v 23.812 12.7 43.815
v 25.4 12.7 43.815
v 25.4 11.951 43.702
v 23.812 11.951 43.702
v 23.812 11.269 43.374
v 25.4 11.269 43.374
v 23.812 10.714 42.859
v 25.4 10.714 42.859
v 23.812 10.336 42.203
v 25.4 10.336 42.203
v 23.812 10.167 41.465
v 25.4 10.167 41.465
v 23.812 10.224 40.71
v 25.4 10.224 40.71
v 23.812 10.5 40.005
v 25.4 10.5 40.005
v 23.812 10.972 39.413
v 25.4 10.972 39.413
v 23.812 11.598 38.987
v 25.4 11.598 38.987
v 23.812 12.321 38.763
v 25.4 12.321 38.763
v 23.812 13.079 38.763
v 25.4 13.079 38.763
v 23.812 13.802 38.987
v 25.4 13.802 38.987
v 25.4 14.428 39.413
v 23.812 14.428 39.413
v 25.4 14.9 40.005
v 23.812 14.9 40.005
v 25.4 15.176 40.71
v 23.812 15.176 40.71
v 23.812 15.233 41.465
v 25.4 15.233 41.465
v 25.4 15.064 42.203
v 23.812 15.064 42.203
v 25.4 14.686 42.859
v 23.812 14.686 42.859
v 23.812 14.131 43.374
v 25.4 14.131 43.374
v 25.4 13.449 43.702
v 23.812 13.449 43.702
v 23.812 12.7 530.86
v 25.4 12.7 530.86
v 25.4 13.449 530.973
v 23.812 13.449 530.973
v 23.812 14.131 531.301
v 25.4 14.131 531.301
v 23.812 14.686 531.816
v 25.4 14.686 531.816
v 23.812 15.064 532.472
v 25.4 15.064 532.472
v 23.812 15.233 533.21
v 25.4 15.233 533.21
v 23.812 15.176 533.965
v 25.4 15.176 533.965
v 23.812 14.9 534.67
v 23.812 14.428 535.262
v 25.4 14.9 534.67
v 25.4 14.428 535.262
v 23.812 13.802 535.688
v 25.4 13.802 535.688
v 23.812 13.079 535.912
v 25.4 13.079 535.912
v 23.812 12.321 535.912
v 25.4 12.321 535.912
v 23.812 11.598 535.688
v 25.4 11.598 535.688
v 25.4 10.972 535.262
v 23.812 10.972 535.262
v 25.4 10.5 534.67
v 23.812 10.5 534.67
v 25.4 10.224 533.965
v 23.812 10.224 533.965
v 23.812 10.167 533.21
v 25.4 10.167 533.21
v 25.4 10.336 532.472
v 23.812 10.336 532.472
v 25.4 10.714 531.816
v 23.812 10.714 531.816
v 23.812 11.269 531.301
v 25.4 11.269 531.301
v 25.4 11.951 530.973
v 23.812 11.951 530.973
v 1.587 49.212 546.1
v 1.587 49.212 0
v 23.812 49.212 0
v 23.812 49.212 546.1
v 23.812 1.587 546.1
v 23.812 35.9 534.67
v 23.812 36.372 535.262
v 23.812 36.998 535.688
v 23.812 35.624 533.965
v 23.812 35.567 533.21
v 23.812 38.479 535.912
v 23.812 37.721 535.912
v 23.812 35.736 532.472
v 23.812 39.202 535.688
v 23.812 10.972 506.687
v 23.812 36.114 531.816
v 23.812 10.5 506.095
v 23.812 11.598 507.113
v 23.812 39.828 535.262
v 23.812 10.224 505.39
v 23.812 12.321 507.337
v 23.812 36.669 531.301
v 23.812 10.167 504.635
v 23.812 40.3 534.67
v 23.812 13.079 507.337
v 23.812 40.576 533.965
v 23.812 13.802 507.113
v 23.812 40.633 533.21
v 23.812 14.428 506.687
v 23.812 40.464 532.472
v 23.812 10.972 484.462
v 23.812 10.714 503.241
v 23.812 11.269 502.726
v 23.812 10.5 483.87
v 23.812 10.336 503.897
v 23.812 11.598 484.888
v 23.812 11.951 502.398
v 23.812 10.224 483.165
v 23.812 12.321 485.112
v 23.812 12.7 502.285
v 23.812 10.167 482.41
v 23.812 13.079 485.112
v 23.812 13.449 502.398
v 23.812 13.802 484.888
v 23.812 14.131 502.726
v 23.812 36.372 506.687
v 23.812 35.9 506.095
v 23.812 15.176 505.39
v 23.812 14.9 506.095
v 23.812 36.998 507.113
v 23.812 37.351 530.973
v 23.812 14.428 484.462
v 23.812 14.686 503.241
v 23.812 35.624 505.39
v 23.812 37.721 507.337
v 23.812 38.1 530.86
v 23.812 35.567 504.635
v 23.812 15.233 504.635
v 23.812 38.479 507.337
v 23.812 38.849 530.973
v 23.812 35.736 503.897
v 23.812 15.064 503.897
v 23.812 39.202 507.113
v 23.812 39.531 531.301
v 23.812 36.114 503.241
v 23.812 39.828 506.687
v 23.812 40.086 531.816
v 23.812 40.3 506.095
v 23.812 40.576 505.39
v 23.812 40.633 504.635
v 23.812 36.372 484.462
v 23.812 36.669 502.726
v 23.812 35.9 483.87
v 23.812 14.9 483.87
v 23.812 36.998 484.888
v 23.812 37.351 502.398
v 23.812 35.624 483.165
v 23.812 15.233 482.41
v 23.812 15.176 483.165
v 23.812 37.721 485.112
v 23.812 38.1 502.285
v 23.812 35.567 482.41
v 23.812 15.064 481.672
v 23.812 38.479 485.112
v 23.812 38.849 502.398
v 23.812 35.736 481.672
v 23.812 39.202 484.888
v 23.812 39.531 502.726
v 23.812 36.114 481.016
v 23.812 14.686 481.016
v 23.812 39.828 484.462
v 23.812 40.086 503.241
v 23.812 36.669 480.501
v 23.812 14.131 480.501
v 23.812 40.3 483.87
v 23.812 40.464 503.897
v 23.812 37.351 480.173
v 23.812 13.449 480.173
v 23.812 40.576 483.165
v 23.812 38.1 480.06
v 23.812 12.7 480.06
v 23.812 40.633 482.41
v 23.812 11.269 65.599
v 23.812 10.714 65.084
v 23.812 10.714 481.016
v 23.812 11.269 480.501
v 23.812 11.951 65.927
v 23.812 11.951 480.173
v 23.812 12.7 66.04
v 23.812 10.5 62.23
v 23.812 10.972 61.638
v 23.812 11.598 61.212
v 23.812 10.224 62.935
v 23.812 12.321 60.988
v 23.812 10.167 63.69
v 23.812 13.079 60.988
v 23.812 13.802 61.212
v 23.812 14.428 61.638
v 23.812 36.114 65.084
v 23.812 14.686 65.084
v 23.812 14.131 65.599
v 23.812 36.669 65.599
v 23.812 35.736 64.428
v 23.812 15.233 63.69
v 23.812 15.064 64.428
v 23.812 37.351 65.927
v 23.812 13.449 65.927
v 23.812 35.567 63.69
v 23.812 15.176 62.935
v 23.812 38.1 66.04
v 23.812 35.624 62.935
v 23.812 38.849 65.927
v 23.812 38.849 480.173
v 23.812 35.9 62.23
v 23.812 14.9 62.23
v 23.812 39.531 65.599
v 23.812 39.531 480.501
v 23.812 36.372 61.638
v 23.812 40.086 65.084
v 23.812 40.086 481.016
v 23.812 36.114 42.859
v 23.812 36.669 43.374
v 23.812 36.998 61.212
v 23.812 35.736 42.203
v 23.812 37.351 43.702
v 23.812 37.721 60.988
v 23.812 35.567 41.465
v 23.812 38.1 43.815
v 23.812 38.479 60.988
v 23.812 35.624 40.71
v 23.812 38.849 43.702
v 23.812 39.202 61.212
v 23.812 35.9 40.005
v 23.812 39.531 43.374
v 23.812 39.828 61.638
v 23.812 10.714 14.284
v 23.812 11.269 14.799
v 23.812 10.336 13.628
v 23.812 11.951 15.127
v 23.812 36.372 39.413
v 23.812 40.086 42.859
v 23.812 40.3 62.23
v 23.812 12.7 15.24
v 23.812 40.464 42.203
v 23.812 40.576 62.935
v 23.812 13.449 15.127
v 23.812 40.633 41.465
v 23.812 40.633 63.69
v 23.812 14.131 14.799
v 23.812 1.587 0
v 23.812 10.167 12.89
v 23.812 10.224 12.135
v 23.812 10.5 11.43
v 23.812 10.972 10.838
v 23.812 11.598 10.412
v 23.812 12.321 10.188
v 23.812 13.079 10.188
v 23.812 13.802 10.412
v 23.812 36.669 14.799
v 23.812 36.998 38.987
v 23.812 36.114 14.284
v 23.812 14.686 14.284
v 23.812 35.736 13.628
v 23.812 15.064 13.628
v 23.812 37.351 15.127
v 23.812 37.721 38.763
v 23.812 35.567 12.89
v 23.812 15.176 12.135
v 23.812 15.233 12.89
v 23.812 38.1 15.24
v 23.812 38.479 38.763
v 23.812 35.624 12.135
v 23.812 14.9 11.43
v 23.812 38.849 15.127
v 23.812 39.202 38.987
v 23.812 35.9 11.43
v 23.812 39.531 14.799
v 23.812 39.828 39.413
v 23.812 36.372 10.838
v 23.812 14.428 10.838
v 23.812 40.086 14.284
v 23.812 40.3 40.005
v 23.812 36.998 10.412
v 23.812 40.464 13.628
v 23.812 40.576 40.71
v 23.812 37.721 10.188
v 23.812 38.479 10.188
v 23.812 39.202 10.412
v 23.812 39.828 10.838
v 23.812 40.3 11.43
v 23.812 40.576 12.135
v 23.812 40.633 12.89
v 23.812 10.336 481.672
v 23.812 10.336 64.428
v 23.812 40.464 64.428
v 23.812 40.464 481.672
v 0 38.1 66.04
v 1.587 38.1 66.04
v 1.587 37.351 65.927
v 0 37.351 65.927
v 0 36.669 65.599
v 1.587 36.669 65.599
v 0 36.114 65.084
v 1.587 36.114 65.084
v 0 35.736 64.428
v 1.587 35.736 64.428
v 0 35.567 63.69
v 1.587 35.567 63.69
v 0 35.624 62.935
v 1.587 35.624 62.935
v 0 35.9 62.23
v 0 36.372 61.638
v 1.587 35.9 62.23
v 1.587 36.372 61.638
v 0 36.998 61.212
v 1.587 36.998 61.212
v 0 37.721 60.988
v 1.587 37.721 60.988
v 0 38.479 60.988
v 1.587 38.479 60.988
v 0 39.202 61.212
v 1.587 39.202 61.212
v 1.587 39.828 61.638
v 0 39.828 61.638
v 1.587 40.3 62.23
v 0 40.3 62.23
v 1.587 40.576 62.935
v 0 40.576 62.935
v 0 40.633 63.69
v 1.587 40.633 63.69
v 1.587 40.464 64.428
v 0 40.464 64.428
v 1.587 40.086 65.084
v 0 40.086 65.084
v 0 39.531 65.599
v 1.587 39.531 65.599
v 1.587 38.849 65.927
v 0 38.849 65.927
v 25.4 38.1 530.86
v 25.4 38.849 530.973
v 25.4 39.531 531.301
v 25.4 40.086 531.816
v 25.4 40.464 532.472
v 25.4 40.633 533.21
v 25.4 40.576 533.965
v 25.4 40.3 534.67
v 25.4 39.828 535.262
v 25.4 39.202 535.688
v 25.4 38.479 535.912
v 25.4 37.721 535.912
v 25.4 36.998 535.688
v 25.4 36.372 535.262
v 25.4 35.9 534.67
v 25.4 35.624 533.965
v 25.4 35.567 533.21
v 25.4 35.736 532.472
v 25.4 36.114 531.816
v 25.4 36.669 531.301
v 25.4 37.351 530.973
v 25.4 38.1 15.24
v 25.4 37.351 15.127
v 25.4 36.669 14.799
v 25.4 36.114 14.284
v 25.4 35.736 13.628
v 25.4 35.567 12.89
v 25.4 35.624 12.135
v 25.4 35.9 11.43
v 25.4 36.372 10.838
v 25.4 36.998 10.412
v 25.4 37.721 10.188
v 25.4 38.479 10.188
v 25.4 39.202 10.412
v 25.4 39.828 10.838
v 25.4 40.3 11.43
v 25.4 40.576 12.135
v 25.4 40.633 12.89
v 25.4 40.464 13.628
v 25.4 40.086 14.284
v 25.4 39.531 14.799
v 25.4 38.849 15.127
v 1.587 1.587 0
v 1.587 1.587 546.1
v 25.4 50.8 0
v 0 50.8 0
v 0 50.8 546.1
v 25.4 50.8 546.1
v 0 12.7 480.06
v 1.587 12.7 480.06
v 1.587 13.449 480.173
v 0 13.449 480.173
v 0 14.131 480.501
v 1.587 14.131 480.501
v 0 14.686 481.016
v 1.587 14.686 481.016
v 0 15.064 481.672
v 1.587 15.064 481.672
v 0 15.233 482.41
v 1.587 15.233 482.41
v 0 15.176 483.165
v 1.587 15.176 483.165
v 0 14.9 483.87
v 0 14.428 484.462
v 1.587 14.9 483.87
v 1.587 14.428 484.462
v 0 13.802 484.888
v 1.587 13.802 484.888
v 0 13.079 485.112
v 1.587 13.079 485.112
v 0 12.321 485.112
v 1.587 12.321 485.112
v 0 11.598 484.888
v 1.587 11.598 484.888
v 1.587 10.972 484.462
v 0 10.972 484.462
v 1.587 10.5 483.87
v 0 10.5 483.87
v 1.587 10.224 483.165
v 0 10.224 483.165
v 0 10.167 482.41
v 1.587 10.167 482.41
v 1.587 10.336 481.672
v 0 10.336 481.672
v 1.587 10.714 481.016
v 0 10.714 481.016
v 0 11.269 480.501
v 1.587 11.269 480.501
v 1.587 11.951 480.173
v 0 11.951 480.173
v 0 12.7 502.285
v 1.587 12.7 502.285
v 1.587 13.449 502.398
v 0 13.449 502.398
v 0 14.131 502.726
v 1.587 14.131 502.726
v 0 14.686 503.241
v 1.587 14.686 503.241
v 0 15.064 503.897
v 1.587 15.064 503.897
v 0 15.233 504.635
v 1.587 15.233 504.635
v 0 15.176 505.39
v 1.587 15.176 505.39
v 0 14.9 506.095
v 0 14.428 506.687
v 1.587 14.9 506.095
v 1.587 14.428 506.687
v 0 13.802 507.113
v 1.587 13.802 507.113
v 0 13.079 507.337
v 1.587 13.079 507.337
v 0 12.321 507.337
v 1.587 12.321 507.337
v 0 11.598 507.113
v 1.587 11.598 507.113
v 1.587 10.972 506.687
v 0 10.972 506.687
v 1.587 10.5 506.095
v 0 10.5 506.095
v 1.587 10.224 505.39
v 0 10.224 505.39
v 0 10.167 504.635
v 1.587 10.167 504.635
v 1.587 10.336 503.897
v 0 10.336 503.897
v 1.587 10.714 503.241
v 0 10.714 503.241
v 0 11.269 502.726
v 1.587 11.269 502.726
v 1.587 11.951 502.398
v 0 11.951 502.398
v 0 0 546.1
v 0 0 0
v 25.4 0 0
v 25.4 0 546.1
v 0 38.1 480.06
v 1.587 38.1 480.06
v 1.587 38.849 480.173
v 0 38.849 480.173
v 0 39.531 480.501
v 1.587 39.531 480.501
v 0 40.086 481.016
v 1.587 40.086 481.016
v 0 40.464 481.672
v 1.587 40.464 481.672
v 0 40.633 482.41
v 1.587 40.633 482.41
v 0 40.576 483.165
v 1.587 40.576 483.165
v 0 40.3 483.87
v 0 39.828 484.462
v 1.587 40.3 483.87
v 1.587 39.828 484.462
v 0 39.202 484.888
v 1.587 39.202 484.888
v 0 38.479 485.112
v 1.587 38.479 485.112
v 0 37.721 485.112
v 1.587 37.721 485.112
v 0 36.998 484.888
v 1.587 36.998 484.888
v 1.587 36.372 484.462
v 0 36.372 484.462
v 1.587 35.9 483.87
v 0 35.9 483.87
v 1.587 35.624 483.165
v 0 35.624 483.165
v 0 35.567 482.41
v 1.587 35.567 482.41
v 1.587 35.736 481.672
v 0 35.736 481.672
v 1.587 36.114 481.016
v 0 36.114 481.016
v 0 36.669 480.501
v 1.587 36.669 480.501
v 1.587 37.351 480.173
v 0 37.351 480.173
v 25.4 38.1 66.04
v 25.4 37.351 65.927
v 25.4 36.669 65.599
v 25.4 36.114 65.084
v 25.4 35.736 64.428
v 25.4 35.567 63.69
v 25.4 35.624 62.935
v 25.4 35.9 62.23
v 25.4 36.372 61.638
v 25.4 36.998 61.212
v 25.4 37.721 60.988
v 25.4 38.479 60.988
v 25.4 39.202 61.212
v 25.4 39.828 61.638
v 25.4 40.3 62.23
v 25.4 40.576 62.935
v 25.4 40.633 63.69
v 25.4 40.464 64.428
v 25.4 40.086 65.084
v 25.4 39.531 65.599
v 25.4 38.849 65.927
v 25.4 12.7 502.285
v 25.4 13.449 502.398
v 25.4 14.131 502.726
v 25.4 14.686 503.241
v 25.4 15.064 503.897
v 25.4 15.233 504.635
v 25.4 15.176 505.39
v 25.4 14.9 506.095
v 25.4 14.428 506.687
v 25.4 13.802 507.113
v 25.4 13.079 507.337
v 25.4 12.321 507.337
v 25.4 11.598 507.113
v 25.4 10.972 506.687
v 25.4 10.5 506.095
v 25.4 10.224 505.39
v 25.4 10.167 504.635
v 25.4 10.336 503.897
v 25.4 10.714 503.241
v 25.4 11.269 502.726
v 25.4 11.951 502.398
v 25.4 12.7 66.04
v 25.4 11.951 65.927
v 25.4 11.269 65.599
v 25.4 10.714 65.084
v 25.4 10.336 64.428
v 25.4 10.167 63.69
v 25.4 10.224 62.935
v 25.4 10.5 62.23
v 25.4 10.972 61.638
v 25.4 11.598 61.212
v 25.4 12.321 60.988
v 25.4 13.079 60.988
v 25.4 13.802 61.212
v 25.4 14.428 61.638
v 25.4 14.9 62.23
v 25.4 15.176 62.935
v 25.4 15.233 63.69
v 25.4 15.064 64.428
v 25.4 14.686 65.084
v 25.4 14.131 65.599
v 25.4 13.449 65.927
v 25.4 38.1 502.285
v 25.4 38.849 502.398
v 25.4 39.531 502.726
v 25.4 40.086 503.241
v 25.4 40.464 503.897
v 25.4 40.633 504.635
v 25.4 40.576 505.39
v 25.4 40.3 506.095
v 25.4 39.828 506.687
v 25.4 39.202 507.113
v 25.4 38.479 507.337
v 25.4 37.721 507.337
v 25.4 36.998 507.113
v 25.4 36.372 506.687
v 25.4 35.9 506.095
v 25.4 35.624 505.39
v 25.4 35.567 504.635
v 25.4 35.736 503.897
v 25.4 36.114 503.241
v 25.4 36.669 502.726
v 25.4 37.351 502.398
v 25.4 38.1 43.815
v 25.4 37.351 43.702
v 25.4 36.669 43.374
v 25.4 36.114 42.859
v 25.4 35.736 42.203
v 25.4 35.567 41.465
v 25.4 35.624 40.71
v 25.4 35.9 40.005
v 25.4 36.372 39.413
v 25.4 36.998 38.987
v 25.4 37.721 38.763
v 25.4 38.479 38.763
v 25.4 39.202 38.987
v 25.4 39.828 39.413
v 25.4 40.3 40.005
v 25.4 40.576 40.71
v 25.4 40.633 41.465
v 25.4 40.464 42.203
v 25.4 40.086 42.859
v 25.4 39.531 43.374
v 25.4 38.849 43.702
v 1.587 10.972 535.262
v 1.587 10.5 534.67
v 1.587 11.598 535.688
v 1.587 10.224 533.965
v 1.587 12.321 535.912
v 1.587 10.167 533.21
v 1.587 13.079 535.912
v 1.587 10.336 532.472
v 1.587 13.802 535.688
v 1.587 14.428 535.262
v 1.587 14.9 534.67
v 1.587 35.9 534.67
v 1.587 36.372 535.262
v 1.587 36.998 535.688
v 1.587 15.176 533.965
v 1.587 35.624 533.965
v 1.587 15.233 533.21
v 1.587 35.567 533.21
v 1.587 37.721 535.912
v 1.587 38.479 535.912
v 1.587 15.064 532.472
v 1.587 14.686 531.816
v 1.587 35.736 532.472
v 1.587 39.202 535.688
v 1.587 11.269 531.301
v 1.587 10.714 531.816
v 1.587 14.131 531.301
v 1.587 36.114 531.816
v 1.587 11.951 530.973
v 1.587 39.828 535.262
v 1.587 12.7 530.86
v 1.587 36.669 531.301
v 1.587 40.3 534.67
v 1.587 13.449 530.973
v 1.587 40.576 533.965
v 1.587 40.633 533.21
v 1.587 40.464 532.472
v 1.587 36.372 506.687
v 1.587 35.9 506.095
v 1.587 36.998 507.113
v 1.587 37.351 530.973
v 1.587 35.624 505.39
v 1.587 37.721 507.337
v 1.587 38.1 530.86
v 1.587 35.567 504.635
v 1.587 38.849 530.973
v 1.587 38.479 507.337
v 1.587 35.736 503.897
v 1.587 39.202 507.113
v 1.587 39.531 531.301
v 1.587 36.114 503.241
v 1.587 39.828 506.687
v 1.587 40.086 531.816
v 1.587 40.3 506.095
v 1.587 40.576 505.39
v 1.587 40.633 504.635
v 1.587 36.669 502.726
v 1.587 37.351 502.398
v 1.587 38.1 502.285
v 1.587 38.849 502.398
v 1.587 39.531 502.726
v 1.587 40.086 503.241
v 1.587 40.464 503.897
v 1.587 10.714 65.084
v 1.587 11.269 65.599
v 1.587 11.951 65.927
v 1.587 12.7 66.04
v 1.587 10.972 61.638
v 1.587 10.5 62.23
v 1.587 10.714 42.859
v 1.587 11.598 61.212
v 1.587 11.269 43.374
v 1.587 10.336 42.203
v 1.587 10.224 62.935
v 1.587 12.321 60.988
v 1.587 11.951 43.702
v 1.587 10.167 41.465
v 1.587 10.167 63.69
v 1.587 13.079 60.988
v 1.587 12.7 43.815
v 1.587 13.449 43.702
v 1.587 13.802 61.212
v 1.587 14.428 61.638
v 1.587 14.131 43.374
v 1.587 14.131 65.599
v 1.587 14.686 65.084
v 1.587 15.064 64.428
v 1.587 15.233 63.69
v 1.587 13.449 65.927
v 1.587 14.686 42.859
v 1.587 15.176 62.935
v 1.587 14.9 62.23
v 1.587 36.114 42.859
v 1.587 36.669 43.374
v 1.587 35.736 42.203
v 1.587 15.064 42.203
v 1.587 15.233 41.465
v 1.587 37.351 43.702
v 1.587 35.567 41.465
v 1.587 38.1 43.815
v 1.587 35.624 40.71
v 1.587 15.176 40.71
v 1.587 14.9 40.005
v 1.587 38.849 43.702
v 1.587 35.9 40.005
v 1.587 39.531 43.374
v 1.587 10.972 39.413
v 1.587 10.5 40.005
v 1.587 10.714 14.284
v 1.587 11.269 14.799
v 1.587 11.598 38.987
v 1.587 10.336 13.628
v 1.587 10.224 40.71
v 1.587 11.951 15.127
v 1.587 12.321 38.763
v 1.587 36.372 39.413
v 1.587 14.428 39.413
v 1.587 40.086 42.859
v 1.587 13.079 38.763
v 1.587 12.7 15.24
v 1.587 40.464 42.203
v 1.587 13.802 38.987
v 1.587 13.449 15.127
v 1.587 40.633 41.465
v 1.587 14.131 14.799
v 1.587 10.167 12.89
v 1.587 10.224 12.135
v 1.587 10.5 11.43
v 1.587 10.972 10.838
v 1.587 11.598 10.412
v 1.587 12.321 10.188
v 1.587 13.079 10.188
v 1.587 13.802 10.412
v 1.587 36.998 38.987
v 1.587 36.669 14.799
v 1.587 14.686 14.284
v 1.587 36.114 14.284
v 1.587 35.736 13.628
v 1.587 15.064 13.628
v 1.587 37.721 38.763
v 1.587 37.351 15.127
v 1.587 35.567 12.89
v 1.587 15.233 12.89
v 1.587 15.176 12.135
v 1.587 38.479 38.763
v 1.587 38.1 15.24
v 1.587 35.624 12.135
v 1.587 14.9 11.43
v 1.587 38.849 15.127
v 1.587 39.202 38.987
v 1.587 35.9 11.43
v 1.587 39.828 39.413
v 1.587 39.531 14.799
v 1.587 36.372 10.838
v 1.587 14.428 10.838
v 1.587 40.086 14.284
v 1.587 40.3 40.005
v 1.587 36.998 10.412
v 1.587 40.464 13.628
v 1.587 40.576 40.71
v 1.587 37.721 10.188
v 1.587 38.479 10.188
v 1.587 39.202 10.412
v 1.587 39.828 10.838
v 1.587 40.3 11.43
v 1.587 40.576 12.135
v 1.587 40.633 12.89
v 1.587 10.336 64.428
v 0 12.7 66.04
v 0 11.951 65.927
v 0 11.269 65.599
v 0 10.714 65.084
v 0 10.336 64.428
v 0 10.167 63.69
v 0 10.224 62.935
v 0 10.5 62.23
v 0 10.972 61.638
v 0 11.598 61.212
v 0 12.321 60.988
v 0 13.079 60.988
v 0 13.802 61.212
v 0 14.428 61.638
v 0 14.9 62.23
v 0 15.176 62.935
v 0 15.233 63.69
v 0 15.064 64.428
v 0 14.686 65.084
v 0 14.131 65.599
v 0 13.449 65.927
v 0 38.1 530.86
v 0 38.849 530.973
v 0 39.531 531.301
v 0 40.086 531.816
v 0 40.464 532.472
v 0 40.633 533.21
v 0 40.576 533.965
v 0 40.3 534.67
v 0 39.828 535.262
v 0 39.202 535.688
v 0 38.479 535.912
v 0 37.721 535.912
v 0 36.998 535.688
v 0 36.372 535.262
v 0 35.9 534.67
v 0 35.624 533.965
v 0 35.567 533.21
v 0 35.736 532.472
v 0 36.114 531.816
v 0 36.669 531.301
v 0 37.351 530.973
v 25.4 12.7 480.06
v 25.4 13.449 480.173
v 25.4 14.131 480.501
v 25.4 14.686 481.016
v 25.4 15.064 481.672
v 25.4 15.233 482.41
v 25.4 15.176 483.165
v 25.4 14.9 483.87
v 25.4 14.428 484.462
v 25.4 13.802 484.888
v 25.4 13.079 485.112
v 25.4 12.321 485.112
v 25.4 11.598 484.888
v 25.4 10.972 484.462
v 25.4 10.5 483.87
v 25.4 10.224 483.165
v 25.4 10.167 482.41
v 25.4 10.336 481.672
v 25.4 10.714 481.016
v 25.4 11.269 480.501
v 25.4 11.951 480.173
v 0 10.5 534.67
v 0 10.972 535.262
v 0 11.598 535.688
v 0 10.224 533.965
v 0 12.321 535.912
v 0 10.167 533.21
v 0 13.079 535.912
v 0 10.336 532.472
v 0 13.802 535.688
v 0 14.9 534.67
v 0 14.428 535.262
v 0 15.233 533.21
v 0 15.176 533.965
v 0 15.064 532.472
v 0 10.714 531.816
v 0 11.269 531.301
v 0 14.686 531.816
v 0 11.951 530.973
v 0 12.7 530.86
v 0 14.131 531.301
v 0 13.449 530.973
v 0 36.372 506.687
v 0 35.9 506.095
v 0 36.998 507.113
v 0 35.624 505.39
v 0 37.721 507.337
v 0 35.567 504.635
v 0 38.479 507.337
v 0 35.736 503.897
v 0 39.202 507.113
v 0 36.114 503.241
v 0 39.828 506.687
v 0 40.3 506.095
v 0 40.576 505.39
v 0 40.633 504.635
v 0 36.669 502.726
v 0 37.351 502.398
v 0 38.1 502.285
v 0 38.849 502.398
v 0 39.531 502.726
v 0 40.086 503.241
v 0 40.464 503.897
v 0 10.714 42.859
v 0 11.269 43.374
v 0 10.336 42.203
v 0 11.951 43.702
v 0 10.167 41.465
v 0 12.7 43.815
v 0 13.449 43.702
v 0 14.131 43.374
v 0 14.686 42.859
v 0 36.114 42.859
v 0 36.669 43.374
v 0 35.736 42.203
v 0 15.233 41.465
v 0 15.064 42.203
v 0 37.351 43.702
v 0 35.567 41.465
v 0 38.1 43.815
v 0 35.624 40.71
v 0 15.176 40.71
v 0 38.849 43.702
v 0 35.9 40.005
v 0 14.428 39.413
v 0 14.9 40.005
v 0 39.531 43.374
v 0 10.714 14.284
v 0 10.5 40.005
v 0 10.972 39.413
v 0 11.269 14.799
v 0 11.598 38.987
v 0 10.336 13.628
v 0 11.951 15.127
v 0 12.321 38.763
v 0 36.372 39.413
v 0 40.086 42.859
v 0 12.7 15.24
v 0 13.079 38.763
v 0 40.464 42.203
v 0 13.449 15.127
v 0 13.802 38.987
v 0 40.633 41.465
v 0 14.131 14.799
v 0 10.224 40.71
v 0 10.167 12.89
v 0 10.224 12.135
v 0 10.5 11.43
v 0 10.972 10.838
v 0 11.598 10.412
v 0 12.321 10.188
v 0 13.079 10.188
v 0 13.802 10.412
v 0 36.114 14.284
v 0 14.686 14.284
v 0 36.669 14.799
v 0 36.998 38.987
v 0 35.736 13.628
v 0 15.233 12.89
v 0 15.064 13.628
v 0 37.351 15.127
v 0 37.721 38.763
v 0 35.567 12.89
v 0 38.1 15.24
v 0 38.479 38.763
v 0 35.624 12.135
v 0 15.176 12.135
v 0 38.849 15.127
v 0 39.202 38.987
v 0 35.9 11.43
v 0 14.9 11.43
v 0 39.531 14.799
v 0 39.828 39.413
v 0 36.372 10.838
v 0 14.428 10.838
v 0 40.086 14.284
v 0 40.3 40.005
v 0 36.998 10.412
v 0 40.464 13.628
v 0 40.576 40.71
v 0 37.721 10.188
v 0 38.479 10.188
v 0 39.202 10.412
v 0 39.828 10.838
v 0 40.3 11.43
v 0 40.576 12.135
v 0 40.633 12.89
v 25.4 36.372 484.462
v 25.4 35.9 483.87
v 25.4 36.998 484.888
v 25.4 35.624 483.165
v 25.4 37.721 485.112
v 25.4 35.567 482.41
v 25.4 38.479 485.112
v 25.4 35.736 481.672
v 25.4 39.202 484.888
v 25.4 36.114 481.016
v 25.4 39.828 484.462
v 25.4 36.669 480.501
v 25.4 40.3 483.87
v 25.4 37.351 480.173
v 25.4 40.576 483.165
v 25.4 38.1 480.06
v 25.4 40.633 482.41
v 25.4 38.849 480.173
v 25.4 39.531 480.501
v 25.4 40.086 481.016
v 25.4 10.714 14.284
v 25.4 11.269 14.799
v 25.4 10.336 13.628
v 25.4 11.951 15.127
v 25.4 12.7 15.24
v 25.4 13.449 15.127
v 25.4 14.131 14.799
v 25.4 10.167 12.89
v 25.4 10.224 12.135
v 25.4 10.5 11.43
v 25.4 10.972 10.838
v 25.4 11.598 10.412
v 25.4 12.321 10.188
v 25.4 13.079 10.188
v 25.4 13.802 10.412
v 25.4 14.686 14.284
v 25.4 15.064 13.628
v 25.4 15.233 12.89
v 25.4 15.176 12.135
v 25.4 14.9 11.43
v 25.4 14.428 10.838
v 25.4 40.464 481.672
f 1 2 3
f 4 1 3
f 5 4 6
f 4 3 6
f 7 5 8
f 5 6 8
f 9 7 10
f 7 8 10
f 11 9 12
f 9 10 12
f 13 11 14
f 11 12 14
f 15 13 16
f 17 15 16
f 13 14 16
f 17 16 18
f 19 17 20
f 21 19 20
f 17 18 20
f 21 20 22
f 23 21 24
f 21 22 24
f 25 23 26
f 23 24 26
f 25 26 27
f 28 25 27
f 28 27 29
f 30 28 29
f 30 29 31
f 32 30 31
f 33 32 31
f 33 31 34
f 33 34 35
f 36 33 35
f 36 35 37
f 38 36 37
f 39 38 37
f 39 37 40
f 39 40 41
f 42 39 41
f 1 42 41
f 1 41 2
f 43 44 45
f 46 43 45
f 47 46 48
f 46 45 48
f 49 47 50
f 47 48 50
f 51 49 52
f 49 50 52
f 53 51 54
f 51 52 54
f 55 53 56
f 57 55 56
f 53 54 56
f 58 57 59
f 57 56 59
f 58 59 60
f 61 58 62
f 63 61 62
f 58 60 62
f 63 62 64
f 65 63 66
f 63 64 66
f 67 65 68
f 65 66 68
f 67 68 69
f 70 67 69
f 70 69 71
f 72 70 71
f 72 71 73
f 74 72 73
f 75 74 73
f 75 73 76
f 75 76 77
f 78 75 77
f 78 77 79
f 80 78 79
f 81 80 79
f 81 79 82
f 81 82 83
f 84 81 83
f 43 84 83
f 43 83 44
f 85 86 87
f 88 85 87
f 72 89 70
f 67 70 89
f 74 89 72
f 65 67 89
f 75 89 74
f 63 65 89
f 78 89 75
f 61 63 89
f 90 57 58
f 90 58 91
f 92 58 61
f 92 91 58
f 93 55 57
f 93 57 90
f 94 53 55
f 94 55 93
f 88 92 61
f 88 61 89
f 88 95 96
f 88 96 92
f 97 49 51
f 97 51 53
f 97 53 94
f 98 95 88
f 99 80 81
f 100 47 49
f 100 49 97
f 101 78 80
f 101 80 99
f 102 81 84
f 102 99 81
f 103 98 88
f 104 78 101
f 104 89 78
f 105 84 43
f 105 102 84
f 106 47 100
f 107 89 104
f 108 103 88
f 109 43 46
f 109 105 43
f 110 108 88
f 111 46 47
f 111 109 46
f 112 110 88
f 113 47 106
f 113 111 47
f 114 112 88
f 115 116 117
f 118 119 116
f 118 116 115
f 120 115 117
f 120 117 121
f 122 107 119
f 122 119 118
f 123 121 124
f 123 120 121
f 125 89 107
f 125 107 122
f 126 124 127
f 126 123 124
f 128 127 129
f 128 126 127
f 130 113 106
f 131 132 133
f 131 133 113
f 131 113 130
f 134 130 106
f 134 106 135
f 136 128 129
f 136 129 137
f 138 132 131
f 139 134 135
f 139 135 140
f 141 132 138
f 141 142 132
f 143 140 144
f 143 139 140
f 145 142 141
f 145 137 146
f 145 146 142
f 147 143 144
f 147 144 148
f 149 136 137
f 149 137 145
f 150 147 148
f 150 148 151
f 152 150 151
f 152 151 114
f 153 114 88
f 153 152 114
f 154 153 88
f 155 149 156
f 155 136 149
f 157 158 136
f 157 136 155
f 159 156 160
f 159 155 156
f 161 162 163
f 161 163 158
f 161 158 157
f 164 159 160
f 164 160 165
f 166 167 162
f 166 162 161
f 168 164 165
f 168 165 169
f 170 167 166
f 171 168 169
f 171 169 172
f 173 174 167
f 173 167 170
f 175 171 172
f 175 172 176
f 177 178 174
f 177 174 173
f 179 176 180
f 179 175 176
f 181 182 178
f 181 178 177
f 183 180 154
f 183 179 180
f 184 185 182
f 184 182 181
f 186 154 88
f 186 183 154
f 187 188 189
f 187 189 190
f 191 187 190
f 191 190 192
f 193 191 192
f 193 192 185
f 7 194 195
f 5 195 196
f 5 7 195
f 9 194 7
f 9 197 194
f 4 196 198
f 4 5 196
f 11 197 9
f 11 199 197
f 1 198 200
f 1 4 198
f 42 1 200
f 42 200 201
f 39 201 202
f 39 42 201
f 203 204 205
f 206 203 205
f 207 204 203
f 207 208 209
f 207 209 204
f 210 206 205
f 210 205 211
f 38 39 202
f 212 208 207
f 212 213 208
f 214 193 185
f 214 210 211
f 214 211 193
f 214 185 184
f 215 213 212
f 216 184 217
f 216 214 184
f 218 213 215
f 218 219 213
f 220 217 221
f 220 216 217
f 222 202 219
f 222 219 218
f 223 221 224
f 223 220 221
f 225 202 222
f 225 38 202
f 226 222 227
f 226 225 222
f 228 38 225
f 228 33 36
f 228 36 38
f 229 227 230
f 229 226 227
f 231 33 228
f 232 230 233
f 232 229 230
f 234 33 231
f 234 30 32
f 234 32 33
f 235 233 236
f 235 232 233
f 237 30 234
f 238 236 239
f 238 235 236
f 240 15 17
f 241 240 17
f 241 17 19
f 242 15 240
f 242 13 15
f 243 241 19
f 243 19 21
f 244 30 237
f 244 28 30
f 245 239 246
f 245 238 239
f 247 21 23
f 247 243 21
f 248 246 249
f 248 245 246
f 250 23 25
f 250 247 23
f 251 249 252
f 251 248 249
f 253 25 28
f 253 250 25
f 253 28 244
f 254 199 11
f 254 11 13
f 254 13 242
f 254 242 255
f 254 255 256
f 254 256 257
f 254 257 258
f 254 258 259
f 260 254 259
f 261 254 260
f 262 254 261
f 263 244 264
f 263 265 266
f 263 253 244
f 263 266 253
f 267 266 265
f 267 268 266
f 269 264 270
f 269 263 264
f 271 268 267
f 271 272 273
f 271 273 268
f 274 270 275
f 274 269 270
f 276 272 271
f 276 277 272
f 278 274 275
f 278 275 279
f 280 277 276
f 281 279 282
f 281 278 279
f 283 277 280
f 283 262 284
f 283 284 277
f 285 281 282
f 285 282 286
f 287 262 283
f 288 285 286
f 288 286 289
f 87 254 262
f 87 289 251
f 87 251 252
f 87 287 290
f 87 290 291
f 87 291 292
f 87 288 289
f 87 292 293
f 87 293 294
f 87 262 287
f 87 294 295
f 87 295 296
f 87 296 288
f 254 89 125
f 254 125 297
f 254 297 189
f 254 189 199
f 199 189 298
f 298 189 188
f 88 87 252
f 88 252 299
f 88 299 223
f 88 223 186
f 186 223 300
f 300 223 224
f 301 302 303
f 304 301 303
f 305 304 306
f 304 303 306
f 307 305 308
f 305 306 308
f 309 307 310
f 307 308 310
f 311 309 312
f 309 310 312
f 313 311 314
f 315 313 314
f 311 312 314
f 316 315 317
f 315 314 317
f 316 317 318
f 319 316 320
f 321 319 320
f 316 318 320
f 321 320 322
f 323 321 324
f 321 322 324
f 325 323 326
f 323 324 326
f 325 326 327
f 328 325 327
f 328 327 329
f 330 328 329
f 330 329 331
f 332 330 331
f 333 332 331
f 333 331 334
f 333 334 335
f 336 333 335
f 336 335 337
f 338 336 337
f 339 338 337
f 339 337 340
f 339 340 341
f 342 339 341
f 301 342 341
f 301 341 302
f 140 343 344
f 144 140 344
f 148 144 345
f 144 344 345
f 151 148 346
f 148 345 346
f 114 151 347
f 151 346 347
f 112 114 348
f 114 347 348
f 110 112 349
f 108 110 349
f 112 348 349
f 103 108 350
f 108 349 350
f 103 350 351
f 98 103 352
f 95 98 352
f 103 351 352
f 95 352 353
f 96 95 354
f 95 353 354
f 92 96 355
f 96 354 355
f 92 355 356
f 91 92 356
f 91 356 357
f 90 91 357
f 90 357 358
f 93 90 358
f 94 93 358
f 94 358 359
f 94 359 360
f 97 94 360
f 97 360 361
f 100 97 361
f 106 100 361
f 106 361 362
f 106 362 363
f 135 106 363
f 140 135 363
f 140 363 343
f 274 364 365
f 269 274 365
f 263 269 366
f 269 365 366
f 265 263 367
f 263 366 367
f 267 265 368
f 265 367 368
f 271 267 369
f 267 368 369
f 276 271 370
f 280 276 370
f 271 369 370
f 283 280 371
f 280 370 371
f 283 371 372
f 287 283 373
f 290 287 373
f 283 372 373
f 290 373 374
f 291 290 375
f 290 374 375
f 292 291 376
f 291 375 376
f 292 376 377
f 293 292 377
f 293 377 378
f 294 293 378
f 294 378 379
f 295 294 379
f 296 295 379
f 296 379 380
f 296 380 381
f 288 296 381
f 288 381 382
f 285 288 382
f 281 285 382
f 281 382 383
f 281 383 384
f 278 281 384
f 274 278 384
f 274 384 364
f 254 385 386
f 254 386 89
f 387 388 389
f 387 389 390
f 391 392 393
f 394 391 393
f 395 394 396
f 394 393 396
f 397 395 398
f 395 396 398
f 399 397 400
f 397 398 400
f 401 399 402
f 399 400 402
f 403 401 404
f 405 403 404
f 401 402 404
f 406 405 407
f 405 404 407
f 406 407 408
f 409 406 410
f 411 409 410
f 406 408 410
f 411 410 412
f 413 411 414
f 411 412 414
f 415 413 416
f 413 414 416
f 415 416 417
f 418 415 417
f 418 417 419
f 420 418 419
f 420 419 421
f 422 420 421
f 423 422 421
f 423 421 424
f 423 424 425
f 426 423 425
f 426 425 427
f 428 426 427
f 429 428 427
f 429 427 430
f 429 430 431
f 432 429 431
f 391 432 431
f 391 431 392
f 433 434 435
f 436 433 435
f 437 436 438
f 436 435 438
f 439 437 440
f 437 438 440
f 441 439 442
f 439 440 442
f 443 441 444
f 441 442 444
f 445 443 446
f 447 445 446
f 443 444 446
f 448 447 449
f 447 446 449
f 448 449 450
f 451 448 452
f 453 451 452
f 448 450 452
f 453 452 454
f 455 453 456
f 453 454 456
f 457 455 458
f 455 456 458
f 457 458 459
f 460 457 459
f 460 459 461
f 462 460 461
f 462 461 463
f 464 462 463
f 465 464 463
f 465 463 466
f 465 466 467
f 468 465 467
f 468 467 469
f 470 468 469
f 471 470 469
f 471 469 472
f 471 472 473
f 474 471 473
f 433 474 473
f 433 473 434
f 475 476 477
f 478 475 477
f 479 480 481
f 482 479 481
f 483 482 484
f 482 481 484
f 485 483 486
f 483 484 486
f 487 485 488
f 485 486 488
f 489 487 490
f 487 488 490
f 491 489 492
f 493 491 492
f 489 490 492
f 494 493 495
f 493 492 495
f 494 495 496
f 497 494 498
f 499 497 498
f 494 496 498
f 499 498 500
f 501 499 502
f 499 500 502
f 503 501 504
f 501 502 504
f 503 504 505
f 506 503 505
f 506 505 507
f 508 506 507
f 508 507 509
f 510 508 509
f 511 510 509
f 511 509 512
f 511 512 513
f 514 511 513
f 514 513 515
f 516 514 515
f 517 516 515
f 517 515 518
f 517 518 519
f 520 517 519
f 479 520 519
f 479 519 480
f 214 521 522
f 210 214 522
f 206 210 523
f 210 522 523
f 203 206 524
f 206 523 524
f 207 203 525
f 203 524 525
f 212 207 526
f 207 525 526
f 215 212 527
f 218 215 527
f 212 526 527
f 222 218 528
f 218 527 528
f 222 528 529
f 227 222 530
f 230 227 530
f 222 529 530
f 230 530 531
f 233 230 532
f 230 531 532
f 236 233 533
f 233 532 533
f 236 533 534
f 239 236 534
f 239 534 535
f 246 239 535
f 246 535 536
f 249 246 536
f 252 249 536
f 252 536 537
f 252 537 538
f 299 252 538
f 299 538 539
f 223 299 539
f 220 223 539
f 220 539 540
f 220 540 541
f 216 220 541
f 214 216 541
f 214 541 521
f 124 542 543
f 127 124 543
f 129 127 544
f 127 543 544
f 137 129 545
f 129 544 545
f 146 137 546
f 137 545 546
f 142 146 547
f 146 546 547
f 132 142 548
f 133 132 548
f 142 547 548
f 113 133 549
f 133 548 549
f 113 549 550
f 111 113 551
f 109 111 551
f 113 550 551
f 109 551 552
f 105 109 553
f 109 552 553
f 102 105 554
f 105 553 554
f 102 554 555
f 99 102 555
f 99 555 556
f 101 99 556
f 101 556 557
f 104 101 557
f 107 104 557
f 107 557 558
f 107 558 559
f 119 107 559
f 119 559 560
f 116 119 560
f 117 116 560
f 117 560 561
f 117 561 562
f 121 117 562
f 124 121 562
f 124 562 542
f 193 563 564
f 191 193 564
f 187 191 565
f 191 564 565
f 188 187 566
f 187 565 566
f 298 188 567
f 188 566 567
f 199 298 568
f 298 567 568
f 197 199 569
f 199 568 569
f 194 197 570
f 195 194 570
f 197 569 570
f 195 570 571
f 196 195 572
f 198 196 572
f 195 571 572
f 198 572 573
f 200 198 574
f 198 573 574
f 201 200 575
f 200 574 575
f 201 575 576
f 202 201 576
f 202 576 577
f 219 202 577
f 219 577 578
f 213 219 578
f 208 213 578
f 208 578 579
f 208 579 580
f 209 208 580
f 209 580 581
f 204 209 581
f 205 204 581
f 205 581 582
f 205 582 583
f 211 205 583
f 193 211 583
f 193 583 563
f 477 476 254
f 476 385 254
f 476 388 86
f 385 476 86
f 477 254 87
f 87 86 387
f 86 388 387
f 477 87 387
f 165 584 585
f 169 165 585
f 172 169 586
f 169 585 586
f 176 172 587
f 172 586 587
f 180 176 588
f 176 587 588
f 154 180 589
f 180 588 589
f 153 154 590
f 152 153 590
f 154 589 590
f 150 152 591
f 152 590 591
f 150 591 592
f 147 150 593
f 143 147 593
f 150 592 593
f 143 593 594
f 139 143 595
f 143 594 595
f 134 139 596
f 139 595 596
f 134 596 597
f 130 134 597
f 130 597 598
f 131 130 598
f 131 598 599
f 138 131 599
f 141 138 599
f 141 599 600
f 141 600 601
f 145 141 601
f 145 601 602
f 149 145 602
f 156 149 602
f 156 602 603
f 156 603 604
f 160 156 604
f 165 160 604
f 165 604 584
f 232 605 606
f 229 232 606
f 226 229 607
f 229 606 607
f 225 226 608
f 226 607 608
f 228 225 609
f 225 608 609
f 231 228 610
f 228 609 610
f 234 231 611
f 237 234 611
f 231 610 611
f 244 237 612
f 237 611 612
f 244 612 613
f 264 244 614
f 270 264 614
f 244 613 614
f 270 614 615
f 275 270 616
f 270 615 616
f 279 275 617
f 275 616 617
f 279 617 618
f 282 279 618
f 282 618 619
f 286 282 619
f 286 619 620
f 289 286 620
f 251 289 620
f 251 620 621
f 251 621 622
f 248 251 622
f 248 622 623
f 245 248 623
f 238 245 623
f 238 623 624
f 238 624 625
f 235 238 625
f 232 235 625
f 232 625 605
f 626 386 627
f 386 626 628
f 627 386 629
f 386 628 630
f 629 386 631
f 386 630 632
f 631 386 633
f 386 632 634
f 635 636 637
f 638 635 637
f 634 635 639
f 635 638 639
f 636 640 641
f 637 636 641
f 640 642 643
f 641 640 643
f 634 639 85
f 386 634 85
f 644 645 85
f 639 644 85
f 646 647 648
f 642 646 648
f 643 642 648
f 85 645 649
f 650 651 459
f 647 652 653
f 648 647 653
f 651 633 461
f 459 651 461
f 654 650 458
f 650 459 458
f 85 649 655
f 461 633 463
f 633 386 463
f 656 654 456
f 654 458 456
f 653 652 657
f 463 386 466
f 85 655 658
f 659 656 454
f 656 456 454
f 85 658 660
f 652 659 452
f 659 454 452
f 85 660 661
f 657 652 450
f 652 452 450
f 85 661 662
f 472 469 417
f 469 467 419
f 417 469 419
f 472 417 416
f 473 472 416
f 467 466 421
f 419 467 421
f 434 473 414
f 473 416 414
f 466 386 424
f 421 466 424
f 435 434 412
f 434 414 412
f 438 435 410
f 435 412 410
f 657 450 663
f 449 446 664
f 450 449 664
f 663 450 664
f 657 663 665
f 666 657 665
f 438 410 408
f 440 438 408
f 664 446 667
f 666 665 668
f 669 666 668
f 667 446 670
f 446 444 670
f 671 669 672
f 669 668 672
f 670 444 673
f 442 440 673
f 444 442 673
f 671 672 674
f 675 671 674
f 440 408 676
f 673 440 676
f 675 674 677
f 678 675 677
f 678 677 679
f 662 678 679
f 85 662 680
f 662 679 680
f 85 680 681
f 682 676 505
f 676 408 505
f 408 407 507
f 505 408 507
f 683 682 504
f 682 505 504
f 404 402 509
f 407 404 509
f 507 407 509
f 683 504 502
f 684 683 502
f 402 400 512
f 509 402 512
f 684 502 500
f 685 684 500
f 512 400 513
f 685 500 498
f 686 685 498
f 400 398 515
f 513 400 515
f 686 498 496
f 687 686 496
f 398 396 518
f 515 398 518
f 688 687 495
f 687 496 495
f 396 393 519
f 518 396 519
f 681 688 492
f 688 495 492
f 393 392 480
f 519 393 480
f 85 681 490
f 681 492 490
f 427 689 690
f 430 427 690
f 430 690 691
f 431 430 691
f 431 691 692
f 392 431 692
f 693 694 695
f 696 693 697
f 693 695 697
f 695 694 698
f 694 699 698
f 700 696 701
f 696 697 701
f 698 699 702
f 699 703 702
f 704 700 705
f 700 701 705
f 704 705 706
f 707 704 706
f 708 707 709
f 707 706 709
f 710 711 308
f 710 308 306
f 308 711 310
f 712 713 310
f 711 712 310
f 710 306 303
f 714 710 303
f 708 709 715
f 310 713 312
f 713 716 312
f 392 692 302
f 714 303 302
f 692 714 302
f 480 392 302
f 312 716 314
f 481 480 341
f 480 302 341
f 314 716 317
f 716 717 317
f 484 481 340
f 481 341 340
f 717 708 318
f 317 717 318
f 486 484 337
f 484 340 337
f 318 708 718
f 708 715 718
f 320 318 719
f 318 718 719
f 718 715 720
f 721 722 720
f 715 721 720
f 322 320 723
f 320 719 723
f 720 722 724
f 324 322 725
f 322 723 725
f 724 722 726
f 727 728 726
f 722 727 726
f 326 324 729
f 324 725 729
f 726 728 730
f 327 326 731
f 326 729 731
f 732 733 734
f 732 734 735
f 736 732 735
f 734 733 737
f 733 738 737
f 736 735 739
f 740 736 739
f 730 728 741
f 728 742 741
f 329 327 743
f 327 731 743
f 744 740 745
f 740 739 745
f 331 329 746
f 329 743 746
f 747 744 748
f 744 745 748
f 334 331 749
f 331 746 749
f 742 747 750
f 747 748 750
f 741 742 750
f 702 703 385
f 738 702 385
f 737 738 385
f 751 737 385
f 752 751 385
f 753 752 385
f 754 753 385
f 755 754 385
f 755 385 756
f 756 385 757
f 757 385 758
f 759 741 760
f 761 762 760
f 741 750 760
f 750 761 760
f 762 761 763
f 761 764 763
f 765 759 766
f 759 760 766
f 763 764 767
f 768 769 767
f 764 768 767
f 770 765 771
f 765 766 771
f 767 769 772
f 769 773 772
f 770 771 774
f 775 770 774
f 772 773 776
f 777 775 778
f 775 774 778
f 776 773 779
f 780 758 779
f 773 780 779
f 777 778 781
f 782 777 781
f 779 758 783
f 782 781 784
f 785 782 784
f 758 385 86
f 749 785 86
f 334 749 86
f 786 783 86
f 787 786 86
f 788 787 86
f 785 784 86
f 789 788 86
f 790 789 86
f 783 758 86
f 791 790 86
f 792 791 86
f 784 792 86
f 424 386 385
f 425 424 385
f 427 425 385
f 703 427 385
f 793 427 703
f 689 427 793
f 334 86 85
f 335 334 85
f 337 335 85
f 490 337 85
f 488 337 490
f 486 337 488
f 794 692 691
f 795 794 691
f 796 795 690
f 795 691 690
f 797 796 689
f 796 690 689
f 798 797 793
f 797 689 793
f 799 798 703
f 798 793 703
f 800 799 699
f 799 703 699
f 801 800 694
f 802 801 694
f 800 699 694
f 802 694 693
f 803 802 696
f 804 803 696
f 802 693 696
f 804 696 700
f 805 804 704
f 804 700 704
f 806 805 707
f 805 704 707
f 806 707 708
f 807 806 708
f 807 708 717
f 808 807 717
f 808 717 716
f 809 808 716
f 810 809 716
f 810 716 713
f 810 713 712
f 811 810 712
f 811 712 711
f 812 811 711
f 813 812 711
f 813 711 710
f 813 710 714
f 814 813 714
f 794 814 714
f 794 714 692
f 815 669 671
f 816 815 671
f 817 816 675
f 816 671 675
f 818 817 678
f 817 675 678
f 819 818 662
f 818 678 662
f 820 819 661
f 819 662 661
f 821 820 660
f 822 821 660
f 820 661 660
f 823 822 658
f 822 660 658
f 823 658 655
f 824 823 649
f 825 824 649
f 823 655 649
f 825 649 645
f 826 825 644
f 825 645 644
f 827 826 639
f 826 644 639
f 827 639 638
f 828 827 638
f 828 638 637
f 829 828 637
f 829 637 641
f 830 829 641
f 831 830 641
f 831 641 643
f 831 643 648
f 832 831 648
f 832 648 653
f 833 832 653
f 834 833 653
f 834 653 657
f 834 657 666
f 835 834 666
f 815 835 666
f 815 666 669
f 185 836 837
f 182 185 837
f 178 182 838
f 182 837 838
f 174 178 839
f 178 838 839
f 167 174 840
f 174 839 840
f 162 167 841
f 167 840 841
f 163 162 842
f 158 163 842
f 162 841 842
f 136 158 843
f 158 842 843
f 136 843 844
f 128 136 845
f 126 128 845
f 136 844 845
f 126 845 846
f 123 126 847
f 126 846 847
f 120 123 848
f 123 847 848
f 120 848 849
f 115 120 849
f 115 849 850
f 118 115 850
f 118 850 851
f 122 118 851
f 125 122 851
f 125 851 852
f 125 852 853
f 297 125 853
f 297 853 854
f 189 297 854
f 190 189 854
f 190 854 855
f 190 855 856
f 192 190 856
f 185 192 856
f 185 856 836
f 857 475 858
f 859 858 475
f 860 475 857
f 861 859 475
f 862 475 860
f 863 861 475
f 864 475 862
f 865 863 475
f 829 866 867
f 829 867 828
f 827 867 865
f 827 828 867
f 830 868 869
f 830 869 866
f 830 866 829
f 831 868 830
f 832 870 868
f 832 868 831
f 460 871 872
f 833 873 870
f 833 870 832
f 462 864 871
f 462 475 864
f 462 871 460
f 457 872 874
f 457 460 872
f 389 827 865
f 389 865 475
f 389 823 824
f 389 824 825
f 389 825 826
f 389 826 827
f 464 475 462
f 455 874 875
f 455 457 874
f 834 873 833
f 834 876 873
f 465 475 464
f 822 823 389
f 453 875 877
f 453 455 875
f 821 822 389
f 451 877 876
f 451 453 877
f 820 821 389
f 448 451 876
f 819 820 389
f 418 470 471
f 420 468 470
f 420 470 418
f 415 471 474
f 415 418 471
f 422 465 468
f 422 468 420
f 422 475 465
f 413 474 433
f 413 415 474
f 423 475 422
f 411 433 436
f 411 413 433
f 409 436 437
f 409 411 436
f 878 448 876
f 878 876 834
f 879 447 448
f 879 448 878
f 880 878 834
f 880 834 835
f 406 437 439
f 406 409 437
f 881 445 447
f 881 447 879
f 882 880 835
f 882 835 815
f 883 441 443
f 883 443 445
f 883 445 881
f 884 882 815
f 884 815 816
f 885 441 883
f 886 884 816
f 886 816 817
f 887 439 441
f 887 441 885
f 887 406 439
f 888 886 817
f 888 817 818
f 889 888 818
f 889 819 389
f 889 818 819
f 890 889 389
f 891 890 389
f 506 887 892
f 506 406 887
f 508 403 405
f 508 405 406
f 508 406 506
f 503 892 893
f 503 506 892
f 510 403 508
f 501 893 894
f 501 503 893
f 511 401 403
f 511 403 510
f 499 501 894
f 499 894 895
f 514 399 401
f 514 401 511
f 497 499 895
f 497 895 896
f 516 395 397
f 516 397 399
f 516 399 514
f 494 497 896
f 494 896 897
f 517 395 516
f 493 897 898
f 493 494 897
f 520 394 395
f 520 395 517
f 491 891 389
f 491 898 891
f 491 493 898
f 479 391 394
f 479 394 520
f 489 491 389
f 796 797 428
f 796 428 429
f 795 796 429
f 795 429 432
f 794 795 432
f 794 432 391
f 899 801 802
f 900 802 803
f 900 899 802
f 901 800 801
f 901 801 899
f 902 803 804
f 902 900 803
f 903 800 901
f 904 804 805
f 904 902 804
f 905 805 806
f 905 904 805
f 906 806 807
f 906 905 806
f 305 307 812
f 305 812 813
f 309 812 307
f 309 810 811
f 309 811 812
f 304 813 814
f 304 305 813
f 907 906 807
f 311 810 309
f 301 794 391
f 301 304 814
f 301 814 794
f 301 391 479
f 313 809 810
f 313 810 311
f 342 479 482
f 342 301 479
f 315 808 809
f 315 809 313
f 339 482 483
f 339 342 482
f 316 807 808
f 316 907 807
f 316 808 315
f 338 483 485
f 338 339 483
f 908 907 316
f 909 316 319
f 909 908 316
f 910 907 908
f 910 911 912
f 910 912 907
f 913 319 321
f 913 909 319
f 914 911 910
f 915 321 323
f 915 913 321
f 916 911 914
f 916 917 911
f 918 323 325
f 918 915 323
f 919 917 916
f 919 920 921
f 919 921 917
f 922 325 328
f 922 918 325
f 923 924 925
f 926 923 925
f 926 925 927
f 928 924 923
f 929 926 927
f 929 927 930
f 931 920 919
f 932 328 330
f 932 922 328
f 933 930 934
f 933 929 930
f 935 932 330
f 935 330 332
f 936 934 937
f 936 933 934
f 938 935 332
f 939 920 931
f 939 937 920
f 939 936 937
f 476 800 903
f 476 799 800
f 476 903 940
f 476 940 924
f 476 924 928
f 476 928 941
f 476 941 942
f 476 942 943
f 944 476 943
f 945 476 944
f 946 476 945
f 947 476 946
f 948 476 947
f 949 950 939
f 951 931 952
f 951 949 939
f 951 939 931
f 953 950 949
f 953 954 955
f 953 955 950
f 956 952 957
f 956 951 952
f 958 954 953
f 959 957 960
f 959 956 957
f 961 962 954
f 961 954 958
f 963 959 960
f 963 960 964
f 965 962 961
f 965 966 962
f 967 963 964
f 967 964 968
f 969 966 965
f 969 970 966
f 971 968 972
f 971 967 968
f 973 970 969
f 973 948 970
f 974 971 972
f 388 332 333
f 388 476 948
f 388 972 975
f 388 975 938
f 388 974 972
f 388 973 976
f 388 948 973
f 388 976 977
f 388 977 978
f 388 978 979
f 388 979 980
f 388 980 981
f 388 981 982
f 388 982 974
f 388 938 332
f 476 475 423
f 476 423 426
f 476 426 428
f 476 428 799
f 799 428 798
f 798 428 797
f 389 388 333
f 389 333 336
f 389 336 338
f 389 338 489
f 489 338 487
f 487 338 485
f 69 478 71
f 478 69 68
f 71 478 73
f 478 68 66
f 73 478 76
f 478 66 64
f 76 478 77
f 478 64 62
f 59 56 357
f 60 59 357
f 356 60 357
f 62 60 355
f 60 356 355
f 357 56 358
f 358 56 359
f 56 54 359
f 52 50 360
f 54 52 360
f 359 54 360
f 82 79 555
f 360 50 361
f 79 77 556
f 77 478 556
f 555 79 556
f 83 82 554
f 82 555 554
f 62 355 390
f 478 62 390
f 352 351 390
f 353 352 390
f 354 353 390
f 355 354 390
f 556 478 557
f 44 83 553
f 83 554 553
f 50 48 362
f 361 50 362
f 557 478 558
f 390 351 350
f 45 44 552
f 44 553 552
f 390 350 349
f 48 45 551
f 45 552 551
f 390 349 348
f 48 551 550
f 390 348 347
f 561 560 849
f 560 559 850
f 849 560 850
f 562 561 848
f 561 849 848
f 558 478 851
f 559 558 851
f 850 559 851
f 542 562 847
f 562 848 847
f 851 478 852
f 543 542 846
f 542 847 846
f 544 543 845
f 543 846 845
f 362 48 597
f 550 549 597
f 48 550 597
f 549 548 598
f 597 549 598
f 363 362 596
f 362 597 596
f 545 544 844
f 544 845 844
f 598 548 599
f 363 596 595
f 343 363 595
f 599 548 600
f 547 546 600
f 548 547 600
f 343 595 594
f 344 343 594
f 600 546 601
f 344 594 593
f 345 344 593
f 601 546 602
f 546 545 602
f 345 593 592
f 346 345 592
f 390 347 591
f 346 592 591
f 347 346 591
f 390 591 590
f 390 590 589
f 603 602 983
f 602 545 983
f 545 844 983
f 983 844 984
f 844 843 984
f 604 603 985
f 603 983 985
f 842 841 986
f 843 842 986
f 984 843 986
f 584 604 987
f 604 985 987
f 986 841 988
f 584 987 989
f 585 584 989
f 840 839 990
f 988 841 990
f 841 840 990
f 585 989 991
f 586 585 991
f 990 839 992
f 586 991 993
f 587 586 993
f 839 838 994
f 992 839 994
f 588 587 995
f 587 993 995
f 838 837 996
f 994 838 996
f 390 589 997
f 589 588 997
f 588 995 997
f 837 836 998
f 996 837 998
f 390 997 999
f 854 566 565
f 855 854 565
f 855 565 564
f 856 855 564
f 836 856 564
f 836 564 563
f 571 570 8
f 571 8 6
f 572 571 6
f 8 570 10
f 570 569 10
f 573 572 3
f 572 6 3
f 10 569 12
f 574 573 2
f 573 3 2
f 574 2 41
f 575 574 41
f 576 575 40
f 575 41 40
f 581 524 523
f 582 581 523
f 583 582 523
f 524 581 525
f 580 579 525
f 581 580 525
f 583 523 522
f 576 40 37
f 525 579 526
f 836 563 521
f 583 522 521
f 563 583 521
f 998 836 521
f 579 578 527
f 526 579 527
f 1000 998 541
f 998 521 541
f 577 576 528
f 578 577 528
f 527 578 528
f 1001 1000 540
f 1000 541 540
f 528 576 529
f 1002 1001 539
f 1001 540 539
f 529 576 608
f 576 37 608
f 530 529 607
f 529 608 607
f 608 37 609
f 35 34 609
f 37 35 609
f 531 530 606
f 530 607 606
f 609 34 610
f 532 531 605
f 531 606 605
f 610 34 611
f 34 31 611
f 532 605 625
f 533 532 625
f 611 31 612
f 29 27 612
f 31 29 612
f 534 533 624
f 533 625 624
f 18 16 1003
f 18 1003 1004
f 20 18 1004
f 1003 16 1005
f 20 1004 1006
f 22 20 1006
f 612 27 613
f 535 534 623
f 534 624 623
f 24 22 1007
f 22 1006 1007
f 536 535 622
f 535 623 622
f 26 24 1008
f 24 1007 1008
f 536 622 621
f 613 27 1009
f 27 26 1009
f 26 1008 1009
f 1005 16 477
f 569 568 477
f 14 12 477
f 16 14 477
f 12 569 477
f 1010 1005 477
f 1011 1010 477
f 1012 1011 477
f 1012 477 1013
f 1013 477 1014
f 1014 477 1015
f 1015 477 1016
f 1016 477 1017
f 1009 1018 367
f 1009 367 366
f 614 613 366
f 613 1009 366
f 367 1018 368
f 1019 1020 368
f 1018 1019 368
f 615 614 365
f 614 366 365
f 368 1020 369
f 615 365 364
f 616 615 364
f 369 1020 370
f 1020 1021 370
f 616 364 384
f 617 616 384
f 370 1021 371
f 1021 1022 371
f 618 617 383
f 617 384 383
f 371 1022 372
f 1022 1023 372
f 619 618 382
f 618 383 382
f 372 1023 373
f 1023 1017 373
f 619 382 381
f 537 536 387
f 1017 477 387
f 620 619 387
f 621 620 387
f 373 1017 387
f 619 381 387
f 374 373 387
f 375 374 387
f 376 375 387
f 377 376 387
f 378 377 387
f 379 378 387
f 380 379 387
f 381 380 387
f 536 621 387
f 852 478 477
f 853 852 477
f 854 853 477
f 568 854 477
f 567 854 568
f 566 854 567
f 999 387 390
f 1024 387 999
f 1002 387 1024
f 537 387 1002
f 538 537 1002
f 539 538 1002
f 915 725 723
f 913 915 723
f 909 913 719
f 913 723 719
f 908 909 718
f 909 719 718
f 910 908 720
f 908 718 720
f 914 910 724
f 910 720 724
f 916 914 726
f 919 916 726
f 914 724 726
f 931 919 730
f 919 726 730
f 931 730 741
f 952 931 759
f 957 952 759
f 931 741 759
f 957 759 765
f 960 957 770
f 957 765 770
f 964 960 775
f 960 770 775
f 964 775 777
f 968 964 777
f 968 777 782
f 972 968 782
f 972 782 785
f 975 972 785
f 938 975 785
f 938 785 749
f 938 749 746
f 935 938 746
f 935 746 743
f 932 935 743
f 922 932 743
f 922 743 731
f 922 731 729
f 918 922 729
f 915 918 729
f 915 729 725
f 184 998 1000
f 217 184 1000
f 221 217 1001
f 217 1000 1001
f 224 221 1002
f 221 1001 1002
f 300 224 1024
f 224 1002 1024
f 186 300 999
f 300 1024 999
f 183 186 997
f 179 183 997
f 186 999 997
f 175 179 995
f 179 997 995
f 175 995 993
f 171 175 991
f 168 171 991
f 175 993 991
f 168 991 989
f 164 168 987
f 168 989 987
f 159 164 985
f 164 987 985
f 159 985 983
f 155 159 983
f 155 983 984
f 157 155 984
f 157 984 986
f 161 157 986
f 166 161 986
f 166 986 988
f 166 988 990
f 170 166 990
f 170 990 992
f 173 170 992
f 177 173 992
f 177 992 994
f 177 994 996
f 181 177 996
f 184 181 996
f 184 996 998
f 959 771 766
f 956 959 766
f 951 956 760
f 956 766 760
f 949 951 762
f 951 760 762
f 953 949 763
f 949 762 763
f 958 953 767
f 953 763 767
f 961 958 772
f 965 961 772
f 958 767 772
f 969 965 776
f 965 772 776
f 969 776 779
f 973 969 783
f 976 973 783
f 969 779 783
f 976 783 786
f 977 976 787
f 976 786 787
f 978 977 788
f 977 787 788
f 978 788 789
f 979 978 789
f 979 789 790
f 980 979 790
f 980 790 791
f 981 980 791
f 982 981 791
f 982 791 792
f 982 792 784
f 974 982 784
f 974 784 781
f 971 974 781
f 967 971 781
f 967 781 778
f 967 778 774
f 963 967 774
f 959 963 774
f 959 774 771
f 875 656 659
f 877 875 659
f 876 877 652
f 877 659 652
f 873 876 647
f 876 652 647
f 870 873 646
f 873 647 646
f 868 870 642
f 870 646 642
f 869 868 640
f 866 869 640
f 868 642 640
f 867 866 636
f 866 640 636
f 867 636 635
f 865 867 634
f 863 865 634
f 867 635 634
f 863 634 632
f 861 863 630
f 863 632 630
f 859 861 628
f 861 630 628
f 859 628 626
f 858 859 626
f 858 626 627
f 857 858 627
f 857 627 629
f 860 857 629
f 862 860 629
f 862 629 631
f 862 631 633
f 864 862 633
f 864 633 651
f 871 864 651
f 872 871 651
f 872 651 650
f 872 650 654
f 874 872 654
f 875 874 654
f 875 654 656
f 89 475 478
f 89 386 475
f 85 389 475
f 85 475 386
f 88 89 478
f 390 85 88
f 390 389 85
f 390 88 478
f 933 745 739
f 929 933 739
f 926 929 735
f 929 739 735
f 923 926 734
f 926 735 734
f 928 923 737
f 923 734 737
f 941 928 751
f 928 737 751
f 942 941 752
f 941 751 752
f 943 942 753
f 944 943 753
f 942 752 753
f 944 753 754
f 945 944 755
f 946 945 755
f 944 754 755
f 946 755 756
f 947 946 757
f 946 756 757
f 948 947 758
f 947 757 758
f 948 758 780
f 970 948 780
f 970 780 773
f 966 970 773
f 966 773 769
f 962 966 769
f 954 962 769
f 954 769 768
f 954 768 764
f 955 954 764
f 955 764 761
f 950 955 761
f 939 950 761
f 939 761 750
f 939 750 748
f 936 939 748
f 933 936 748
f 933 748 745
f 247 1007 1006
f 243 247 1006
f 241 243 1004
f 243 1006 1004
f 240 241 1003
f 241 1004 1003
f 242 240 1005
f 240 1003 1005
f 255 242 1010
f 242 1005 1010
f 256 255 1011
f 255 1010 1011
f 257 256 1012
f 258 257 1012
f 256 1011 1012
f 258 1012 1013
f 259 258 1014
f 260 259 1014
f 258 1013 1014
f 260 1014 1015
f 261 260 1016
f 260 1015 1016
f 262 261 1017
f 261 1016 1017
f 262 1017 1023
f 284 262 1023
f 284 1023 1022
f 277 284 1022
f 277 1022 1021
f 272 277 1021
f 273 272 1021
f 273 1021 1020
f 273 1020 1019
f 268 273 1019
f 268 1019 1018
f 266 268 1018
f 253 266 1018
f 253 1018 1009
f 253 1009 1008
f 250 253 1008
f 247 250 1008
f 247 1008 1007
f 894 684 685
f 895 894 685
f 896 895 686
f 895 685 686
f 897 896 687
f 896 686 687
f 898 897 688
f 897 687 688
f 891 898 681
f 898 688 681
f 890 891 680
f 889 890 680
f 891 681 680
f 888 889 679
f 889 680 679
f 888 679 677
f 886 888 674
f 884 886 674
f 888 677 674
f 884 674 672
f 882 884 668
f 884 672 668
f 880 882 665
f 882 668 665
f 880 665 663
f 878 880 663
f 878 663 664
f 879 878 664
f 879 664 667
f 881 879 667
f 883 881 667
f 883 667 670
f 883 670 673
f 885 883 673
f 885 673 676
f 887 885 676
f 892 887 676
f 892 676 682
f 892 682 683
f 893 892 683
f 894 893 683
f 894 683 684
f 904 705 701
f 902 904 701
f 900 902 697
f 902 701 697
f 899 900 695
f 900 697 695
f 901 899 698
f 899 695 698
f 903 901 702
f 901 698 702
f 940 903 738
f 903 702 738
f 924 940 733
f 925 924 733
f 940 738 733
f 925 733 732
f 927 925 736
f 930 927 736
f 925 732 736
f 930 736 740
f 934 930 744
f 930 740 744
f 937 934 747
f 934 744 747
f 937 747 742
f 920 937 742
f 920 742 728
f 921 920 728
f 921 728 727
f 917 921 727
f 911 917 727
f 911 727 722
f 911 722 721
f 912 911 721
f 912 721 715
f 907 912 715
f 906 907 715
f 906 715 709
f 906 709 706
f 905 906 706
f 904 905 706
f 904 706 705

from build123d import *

# Parameters (mm, degrees)
SKETCH1_W           = 25.4
SKETCH1_H           = 50.8
SKETCH1_W_2         = 22.225
SKETCH1_H_2         = 47.625
BOSS_EXTRUDE1_DEPTH = 546.1
SKETCH2_R           = 2.54
CUT_EXTRUDE1_DEPTH  = 550.045544559


with BuildPart() as part:
    # Sketch1 → Boss-Extrude1 (new body)
    with BuildSketch(Plane.XY):
        with Locations((12.7, 25.4)):
            Rectangle(SKETCH1_W, SKETCH1_H)
        with Locations((12.7, 25.4)):
            Rectangle(SKETCH1_W_2, SKETCH1_H_2, mode=Mode.SUBTRACT)
    extrude(amount=BOSS_EXTRUDE1_DEPTH)

    # Sketch2 → Cut-Extrude1 (cut, through all)
    with BuildSketch(Plane(origin=(25.4, 0, 0), x_dir=(0, 0, -1), z_dir=(1, 0, 0))):
        with Locations((-504.825, 38.1)):
            Circle(SKETCH2_R)
        with Locations((-504.825, 12.7)):
            Circle(SKETCH2_R)
        with Locations((-482.6, 38.1)):
            Circle(SKETCH2_R)
        with Locations((-482.6, 12.7)):
            Circle(SKETCH2_R)
        with Locations((-533.4, 12.7)):
            Circle(SKETCH2_R)
        with Locations((-533.4, 38.1)):
            Circle(SKETCH2_R)
        with Locations(Location((-12.7, 38.1, 0), (0, 0, 180))):
            Circle(SKETCH2_R)
        with Locations(Location((-12.7, 12.7, 0), (0, 0, 180))):
            Circle(SKETCH2_R)
        with Locations(Location((-63.5, 12.7, 0), (0, 0, 180))):
            Circle(SKETCH2_R)
        with Locations(Location((-63.5, 38.1, 0), (0, 0, 180))):
            Circle(SKETCH2_R)
        with Locations(Location((-41.275, 12.7, 0), (0, 0, 180))):
            Circle(SKETCH2_R)
        with Locations(Location((-41.275, 38.1, 0), (0, 0, 180))):
            Circle(SKETCH2_R)
    extrude(amount=-CUT_EXTRUDE1_DEPTH, mode=Mode.SUBTRACT)


solid = part.part
